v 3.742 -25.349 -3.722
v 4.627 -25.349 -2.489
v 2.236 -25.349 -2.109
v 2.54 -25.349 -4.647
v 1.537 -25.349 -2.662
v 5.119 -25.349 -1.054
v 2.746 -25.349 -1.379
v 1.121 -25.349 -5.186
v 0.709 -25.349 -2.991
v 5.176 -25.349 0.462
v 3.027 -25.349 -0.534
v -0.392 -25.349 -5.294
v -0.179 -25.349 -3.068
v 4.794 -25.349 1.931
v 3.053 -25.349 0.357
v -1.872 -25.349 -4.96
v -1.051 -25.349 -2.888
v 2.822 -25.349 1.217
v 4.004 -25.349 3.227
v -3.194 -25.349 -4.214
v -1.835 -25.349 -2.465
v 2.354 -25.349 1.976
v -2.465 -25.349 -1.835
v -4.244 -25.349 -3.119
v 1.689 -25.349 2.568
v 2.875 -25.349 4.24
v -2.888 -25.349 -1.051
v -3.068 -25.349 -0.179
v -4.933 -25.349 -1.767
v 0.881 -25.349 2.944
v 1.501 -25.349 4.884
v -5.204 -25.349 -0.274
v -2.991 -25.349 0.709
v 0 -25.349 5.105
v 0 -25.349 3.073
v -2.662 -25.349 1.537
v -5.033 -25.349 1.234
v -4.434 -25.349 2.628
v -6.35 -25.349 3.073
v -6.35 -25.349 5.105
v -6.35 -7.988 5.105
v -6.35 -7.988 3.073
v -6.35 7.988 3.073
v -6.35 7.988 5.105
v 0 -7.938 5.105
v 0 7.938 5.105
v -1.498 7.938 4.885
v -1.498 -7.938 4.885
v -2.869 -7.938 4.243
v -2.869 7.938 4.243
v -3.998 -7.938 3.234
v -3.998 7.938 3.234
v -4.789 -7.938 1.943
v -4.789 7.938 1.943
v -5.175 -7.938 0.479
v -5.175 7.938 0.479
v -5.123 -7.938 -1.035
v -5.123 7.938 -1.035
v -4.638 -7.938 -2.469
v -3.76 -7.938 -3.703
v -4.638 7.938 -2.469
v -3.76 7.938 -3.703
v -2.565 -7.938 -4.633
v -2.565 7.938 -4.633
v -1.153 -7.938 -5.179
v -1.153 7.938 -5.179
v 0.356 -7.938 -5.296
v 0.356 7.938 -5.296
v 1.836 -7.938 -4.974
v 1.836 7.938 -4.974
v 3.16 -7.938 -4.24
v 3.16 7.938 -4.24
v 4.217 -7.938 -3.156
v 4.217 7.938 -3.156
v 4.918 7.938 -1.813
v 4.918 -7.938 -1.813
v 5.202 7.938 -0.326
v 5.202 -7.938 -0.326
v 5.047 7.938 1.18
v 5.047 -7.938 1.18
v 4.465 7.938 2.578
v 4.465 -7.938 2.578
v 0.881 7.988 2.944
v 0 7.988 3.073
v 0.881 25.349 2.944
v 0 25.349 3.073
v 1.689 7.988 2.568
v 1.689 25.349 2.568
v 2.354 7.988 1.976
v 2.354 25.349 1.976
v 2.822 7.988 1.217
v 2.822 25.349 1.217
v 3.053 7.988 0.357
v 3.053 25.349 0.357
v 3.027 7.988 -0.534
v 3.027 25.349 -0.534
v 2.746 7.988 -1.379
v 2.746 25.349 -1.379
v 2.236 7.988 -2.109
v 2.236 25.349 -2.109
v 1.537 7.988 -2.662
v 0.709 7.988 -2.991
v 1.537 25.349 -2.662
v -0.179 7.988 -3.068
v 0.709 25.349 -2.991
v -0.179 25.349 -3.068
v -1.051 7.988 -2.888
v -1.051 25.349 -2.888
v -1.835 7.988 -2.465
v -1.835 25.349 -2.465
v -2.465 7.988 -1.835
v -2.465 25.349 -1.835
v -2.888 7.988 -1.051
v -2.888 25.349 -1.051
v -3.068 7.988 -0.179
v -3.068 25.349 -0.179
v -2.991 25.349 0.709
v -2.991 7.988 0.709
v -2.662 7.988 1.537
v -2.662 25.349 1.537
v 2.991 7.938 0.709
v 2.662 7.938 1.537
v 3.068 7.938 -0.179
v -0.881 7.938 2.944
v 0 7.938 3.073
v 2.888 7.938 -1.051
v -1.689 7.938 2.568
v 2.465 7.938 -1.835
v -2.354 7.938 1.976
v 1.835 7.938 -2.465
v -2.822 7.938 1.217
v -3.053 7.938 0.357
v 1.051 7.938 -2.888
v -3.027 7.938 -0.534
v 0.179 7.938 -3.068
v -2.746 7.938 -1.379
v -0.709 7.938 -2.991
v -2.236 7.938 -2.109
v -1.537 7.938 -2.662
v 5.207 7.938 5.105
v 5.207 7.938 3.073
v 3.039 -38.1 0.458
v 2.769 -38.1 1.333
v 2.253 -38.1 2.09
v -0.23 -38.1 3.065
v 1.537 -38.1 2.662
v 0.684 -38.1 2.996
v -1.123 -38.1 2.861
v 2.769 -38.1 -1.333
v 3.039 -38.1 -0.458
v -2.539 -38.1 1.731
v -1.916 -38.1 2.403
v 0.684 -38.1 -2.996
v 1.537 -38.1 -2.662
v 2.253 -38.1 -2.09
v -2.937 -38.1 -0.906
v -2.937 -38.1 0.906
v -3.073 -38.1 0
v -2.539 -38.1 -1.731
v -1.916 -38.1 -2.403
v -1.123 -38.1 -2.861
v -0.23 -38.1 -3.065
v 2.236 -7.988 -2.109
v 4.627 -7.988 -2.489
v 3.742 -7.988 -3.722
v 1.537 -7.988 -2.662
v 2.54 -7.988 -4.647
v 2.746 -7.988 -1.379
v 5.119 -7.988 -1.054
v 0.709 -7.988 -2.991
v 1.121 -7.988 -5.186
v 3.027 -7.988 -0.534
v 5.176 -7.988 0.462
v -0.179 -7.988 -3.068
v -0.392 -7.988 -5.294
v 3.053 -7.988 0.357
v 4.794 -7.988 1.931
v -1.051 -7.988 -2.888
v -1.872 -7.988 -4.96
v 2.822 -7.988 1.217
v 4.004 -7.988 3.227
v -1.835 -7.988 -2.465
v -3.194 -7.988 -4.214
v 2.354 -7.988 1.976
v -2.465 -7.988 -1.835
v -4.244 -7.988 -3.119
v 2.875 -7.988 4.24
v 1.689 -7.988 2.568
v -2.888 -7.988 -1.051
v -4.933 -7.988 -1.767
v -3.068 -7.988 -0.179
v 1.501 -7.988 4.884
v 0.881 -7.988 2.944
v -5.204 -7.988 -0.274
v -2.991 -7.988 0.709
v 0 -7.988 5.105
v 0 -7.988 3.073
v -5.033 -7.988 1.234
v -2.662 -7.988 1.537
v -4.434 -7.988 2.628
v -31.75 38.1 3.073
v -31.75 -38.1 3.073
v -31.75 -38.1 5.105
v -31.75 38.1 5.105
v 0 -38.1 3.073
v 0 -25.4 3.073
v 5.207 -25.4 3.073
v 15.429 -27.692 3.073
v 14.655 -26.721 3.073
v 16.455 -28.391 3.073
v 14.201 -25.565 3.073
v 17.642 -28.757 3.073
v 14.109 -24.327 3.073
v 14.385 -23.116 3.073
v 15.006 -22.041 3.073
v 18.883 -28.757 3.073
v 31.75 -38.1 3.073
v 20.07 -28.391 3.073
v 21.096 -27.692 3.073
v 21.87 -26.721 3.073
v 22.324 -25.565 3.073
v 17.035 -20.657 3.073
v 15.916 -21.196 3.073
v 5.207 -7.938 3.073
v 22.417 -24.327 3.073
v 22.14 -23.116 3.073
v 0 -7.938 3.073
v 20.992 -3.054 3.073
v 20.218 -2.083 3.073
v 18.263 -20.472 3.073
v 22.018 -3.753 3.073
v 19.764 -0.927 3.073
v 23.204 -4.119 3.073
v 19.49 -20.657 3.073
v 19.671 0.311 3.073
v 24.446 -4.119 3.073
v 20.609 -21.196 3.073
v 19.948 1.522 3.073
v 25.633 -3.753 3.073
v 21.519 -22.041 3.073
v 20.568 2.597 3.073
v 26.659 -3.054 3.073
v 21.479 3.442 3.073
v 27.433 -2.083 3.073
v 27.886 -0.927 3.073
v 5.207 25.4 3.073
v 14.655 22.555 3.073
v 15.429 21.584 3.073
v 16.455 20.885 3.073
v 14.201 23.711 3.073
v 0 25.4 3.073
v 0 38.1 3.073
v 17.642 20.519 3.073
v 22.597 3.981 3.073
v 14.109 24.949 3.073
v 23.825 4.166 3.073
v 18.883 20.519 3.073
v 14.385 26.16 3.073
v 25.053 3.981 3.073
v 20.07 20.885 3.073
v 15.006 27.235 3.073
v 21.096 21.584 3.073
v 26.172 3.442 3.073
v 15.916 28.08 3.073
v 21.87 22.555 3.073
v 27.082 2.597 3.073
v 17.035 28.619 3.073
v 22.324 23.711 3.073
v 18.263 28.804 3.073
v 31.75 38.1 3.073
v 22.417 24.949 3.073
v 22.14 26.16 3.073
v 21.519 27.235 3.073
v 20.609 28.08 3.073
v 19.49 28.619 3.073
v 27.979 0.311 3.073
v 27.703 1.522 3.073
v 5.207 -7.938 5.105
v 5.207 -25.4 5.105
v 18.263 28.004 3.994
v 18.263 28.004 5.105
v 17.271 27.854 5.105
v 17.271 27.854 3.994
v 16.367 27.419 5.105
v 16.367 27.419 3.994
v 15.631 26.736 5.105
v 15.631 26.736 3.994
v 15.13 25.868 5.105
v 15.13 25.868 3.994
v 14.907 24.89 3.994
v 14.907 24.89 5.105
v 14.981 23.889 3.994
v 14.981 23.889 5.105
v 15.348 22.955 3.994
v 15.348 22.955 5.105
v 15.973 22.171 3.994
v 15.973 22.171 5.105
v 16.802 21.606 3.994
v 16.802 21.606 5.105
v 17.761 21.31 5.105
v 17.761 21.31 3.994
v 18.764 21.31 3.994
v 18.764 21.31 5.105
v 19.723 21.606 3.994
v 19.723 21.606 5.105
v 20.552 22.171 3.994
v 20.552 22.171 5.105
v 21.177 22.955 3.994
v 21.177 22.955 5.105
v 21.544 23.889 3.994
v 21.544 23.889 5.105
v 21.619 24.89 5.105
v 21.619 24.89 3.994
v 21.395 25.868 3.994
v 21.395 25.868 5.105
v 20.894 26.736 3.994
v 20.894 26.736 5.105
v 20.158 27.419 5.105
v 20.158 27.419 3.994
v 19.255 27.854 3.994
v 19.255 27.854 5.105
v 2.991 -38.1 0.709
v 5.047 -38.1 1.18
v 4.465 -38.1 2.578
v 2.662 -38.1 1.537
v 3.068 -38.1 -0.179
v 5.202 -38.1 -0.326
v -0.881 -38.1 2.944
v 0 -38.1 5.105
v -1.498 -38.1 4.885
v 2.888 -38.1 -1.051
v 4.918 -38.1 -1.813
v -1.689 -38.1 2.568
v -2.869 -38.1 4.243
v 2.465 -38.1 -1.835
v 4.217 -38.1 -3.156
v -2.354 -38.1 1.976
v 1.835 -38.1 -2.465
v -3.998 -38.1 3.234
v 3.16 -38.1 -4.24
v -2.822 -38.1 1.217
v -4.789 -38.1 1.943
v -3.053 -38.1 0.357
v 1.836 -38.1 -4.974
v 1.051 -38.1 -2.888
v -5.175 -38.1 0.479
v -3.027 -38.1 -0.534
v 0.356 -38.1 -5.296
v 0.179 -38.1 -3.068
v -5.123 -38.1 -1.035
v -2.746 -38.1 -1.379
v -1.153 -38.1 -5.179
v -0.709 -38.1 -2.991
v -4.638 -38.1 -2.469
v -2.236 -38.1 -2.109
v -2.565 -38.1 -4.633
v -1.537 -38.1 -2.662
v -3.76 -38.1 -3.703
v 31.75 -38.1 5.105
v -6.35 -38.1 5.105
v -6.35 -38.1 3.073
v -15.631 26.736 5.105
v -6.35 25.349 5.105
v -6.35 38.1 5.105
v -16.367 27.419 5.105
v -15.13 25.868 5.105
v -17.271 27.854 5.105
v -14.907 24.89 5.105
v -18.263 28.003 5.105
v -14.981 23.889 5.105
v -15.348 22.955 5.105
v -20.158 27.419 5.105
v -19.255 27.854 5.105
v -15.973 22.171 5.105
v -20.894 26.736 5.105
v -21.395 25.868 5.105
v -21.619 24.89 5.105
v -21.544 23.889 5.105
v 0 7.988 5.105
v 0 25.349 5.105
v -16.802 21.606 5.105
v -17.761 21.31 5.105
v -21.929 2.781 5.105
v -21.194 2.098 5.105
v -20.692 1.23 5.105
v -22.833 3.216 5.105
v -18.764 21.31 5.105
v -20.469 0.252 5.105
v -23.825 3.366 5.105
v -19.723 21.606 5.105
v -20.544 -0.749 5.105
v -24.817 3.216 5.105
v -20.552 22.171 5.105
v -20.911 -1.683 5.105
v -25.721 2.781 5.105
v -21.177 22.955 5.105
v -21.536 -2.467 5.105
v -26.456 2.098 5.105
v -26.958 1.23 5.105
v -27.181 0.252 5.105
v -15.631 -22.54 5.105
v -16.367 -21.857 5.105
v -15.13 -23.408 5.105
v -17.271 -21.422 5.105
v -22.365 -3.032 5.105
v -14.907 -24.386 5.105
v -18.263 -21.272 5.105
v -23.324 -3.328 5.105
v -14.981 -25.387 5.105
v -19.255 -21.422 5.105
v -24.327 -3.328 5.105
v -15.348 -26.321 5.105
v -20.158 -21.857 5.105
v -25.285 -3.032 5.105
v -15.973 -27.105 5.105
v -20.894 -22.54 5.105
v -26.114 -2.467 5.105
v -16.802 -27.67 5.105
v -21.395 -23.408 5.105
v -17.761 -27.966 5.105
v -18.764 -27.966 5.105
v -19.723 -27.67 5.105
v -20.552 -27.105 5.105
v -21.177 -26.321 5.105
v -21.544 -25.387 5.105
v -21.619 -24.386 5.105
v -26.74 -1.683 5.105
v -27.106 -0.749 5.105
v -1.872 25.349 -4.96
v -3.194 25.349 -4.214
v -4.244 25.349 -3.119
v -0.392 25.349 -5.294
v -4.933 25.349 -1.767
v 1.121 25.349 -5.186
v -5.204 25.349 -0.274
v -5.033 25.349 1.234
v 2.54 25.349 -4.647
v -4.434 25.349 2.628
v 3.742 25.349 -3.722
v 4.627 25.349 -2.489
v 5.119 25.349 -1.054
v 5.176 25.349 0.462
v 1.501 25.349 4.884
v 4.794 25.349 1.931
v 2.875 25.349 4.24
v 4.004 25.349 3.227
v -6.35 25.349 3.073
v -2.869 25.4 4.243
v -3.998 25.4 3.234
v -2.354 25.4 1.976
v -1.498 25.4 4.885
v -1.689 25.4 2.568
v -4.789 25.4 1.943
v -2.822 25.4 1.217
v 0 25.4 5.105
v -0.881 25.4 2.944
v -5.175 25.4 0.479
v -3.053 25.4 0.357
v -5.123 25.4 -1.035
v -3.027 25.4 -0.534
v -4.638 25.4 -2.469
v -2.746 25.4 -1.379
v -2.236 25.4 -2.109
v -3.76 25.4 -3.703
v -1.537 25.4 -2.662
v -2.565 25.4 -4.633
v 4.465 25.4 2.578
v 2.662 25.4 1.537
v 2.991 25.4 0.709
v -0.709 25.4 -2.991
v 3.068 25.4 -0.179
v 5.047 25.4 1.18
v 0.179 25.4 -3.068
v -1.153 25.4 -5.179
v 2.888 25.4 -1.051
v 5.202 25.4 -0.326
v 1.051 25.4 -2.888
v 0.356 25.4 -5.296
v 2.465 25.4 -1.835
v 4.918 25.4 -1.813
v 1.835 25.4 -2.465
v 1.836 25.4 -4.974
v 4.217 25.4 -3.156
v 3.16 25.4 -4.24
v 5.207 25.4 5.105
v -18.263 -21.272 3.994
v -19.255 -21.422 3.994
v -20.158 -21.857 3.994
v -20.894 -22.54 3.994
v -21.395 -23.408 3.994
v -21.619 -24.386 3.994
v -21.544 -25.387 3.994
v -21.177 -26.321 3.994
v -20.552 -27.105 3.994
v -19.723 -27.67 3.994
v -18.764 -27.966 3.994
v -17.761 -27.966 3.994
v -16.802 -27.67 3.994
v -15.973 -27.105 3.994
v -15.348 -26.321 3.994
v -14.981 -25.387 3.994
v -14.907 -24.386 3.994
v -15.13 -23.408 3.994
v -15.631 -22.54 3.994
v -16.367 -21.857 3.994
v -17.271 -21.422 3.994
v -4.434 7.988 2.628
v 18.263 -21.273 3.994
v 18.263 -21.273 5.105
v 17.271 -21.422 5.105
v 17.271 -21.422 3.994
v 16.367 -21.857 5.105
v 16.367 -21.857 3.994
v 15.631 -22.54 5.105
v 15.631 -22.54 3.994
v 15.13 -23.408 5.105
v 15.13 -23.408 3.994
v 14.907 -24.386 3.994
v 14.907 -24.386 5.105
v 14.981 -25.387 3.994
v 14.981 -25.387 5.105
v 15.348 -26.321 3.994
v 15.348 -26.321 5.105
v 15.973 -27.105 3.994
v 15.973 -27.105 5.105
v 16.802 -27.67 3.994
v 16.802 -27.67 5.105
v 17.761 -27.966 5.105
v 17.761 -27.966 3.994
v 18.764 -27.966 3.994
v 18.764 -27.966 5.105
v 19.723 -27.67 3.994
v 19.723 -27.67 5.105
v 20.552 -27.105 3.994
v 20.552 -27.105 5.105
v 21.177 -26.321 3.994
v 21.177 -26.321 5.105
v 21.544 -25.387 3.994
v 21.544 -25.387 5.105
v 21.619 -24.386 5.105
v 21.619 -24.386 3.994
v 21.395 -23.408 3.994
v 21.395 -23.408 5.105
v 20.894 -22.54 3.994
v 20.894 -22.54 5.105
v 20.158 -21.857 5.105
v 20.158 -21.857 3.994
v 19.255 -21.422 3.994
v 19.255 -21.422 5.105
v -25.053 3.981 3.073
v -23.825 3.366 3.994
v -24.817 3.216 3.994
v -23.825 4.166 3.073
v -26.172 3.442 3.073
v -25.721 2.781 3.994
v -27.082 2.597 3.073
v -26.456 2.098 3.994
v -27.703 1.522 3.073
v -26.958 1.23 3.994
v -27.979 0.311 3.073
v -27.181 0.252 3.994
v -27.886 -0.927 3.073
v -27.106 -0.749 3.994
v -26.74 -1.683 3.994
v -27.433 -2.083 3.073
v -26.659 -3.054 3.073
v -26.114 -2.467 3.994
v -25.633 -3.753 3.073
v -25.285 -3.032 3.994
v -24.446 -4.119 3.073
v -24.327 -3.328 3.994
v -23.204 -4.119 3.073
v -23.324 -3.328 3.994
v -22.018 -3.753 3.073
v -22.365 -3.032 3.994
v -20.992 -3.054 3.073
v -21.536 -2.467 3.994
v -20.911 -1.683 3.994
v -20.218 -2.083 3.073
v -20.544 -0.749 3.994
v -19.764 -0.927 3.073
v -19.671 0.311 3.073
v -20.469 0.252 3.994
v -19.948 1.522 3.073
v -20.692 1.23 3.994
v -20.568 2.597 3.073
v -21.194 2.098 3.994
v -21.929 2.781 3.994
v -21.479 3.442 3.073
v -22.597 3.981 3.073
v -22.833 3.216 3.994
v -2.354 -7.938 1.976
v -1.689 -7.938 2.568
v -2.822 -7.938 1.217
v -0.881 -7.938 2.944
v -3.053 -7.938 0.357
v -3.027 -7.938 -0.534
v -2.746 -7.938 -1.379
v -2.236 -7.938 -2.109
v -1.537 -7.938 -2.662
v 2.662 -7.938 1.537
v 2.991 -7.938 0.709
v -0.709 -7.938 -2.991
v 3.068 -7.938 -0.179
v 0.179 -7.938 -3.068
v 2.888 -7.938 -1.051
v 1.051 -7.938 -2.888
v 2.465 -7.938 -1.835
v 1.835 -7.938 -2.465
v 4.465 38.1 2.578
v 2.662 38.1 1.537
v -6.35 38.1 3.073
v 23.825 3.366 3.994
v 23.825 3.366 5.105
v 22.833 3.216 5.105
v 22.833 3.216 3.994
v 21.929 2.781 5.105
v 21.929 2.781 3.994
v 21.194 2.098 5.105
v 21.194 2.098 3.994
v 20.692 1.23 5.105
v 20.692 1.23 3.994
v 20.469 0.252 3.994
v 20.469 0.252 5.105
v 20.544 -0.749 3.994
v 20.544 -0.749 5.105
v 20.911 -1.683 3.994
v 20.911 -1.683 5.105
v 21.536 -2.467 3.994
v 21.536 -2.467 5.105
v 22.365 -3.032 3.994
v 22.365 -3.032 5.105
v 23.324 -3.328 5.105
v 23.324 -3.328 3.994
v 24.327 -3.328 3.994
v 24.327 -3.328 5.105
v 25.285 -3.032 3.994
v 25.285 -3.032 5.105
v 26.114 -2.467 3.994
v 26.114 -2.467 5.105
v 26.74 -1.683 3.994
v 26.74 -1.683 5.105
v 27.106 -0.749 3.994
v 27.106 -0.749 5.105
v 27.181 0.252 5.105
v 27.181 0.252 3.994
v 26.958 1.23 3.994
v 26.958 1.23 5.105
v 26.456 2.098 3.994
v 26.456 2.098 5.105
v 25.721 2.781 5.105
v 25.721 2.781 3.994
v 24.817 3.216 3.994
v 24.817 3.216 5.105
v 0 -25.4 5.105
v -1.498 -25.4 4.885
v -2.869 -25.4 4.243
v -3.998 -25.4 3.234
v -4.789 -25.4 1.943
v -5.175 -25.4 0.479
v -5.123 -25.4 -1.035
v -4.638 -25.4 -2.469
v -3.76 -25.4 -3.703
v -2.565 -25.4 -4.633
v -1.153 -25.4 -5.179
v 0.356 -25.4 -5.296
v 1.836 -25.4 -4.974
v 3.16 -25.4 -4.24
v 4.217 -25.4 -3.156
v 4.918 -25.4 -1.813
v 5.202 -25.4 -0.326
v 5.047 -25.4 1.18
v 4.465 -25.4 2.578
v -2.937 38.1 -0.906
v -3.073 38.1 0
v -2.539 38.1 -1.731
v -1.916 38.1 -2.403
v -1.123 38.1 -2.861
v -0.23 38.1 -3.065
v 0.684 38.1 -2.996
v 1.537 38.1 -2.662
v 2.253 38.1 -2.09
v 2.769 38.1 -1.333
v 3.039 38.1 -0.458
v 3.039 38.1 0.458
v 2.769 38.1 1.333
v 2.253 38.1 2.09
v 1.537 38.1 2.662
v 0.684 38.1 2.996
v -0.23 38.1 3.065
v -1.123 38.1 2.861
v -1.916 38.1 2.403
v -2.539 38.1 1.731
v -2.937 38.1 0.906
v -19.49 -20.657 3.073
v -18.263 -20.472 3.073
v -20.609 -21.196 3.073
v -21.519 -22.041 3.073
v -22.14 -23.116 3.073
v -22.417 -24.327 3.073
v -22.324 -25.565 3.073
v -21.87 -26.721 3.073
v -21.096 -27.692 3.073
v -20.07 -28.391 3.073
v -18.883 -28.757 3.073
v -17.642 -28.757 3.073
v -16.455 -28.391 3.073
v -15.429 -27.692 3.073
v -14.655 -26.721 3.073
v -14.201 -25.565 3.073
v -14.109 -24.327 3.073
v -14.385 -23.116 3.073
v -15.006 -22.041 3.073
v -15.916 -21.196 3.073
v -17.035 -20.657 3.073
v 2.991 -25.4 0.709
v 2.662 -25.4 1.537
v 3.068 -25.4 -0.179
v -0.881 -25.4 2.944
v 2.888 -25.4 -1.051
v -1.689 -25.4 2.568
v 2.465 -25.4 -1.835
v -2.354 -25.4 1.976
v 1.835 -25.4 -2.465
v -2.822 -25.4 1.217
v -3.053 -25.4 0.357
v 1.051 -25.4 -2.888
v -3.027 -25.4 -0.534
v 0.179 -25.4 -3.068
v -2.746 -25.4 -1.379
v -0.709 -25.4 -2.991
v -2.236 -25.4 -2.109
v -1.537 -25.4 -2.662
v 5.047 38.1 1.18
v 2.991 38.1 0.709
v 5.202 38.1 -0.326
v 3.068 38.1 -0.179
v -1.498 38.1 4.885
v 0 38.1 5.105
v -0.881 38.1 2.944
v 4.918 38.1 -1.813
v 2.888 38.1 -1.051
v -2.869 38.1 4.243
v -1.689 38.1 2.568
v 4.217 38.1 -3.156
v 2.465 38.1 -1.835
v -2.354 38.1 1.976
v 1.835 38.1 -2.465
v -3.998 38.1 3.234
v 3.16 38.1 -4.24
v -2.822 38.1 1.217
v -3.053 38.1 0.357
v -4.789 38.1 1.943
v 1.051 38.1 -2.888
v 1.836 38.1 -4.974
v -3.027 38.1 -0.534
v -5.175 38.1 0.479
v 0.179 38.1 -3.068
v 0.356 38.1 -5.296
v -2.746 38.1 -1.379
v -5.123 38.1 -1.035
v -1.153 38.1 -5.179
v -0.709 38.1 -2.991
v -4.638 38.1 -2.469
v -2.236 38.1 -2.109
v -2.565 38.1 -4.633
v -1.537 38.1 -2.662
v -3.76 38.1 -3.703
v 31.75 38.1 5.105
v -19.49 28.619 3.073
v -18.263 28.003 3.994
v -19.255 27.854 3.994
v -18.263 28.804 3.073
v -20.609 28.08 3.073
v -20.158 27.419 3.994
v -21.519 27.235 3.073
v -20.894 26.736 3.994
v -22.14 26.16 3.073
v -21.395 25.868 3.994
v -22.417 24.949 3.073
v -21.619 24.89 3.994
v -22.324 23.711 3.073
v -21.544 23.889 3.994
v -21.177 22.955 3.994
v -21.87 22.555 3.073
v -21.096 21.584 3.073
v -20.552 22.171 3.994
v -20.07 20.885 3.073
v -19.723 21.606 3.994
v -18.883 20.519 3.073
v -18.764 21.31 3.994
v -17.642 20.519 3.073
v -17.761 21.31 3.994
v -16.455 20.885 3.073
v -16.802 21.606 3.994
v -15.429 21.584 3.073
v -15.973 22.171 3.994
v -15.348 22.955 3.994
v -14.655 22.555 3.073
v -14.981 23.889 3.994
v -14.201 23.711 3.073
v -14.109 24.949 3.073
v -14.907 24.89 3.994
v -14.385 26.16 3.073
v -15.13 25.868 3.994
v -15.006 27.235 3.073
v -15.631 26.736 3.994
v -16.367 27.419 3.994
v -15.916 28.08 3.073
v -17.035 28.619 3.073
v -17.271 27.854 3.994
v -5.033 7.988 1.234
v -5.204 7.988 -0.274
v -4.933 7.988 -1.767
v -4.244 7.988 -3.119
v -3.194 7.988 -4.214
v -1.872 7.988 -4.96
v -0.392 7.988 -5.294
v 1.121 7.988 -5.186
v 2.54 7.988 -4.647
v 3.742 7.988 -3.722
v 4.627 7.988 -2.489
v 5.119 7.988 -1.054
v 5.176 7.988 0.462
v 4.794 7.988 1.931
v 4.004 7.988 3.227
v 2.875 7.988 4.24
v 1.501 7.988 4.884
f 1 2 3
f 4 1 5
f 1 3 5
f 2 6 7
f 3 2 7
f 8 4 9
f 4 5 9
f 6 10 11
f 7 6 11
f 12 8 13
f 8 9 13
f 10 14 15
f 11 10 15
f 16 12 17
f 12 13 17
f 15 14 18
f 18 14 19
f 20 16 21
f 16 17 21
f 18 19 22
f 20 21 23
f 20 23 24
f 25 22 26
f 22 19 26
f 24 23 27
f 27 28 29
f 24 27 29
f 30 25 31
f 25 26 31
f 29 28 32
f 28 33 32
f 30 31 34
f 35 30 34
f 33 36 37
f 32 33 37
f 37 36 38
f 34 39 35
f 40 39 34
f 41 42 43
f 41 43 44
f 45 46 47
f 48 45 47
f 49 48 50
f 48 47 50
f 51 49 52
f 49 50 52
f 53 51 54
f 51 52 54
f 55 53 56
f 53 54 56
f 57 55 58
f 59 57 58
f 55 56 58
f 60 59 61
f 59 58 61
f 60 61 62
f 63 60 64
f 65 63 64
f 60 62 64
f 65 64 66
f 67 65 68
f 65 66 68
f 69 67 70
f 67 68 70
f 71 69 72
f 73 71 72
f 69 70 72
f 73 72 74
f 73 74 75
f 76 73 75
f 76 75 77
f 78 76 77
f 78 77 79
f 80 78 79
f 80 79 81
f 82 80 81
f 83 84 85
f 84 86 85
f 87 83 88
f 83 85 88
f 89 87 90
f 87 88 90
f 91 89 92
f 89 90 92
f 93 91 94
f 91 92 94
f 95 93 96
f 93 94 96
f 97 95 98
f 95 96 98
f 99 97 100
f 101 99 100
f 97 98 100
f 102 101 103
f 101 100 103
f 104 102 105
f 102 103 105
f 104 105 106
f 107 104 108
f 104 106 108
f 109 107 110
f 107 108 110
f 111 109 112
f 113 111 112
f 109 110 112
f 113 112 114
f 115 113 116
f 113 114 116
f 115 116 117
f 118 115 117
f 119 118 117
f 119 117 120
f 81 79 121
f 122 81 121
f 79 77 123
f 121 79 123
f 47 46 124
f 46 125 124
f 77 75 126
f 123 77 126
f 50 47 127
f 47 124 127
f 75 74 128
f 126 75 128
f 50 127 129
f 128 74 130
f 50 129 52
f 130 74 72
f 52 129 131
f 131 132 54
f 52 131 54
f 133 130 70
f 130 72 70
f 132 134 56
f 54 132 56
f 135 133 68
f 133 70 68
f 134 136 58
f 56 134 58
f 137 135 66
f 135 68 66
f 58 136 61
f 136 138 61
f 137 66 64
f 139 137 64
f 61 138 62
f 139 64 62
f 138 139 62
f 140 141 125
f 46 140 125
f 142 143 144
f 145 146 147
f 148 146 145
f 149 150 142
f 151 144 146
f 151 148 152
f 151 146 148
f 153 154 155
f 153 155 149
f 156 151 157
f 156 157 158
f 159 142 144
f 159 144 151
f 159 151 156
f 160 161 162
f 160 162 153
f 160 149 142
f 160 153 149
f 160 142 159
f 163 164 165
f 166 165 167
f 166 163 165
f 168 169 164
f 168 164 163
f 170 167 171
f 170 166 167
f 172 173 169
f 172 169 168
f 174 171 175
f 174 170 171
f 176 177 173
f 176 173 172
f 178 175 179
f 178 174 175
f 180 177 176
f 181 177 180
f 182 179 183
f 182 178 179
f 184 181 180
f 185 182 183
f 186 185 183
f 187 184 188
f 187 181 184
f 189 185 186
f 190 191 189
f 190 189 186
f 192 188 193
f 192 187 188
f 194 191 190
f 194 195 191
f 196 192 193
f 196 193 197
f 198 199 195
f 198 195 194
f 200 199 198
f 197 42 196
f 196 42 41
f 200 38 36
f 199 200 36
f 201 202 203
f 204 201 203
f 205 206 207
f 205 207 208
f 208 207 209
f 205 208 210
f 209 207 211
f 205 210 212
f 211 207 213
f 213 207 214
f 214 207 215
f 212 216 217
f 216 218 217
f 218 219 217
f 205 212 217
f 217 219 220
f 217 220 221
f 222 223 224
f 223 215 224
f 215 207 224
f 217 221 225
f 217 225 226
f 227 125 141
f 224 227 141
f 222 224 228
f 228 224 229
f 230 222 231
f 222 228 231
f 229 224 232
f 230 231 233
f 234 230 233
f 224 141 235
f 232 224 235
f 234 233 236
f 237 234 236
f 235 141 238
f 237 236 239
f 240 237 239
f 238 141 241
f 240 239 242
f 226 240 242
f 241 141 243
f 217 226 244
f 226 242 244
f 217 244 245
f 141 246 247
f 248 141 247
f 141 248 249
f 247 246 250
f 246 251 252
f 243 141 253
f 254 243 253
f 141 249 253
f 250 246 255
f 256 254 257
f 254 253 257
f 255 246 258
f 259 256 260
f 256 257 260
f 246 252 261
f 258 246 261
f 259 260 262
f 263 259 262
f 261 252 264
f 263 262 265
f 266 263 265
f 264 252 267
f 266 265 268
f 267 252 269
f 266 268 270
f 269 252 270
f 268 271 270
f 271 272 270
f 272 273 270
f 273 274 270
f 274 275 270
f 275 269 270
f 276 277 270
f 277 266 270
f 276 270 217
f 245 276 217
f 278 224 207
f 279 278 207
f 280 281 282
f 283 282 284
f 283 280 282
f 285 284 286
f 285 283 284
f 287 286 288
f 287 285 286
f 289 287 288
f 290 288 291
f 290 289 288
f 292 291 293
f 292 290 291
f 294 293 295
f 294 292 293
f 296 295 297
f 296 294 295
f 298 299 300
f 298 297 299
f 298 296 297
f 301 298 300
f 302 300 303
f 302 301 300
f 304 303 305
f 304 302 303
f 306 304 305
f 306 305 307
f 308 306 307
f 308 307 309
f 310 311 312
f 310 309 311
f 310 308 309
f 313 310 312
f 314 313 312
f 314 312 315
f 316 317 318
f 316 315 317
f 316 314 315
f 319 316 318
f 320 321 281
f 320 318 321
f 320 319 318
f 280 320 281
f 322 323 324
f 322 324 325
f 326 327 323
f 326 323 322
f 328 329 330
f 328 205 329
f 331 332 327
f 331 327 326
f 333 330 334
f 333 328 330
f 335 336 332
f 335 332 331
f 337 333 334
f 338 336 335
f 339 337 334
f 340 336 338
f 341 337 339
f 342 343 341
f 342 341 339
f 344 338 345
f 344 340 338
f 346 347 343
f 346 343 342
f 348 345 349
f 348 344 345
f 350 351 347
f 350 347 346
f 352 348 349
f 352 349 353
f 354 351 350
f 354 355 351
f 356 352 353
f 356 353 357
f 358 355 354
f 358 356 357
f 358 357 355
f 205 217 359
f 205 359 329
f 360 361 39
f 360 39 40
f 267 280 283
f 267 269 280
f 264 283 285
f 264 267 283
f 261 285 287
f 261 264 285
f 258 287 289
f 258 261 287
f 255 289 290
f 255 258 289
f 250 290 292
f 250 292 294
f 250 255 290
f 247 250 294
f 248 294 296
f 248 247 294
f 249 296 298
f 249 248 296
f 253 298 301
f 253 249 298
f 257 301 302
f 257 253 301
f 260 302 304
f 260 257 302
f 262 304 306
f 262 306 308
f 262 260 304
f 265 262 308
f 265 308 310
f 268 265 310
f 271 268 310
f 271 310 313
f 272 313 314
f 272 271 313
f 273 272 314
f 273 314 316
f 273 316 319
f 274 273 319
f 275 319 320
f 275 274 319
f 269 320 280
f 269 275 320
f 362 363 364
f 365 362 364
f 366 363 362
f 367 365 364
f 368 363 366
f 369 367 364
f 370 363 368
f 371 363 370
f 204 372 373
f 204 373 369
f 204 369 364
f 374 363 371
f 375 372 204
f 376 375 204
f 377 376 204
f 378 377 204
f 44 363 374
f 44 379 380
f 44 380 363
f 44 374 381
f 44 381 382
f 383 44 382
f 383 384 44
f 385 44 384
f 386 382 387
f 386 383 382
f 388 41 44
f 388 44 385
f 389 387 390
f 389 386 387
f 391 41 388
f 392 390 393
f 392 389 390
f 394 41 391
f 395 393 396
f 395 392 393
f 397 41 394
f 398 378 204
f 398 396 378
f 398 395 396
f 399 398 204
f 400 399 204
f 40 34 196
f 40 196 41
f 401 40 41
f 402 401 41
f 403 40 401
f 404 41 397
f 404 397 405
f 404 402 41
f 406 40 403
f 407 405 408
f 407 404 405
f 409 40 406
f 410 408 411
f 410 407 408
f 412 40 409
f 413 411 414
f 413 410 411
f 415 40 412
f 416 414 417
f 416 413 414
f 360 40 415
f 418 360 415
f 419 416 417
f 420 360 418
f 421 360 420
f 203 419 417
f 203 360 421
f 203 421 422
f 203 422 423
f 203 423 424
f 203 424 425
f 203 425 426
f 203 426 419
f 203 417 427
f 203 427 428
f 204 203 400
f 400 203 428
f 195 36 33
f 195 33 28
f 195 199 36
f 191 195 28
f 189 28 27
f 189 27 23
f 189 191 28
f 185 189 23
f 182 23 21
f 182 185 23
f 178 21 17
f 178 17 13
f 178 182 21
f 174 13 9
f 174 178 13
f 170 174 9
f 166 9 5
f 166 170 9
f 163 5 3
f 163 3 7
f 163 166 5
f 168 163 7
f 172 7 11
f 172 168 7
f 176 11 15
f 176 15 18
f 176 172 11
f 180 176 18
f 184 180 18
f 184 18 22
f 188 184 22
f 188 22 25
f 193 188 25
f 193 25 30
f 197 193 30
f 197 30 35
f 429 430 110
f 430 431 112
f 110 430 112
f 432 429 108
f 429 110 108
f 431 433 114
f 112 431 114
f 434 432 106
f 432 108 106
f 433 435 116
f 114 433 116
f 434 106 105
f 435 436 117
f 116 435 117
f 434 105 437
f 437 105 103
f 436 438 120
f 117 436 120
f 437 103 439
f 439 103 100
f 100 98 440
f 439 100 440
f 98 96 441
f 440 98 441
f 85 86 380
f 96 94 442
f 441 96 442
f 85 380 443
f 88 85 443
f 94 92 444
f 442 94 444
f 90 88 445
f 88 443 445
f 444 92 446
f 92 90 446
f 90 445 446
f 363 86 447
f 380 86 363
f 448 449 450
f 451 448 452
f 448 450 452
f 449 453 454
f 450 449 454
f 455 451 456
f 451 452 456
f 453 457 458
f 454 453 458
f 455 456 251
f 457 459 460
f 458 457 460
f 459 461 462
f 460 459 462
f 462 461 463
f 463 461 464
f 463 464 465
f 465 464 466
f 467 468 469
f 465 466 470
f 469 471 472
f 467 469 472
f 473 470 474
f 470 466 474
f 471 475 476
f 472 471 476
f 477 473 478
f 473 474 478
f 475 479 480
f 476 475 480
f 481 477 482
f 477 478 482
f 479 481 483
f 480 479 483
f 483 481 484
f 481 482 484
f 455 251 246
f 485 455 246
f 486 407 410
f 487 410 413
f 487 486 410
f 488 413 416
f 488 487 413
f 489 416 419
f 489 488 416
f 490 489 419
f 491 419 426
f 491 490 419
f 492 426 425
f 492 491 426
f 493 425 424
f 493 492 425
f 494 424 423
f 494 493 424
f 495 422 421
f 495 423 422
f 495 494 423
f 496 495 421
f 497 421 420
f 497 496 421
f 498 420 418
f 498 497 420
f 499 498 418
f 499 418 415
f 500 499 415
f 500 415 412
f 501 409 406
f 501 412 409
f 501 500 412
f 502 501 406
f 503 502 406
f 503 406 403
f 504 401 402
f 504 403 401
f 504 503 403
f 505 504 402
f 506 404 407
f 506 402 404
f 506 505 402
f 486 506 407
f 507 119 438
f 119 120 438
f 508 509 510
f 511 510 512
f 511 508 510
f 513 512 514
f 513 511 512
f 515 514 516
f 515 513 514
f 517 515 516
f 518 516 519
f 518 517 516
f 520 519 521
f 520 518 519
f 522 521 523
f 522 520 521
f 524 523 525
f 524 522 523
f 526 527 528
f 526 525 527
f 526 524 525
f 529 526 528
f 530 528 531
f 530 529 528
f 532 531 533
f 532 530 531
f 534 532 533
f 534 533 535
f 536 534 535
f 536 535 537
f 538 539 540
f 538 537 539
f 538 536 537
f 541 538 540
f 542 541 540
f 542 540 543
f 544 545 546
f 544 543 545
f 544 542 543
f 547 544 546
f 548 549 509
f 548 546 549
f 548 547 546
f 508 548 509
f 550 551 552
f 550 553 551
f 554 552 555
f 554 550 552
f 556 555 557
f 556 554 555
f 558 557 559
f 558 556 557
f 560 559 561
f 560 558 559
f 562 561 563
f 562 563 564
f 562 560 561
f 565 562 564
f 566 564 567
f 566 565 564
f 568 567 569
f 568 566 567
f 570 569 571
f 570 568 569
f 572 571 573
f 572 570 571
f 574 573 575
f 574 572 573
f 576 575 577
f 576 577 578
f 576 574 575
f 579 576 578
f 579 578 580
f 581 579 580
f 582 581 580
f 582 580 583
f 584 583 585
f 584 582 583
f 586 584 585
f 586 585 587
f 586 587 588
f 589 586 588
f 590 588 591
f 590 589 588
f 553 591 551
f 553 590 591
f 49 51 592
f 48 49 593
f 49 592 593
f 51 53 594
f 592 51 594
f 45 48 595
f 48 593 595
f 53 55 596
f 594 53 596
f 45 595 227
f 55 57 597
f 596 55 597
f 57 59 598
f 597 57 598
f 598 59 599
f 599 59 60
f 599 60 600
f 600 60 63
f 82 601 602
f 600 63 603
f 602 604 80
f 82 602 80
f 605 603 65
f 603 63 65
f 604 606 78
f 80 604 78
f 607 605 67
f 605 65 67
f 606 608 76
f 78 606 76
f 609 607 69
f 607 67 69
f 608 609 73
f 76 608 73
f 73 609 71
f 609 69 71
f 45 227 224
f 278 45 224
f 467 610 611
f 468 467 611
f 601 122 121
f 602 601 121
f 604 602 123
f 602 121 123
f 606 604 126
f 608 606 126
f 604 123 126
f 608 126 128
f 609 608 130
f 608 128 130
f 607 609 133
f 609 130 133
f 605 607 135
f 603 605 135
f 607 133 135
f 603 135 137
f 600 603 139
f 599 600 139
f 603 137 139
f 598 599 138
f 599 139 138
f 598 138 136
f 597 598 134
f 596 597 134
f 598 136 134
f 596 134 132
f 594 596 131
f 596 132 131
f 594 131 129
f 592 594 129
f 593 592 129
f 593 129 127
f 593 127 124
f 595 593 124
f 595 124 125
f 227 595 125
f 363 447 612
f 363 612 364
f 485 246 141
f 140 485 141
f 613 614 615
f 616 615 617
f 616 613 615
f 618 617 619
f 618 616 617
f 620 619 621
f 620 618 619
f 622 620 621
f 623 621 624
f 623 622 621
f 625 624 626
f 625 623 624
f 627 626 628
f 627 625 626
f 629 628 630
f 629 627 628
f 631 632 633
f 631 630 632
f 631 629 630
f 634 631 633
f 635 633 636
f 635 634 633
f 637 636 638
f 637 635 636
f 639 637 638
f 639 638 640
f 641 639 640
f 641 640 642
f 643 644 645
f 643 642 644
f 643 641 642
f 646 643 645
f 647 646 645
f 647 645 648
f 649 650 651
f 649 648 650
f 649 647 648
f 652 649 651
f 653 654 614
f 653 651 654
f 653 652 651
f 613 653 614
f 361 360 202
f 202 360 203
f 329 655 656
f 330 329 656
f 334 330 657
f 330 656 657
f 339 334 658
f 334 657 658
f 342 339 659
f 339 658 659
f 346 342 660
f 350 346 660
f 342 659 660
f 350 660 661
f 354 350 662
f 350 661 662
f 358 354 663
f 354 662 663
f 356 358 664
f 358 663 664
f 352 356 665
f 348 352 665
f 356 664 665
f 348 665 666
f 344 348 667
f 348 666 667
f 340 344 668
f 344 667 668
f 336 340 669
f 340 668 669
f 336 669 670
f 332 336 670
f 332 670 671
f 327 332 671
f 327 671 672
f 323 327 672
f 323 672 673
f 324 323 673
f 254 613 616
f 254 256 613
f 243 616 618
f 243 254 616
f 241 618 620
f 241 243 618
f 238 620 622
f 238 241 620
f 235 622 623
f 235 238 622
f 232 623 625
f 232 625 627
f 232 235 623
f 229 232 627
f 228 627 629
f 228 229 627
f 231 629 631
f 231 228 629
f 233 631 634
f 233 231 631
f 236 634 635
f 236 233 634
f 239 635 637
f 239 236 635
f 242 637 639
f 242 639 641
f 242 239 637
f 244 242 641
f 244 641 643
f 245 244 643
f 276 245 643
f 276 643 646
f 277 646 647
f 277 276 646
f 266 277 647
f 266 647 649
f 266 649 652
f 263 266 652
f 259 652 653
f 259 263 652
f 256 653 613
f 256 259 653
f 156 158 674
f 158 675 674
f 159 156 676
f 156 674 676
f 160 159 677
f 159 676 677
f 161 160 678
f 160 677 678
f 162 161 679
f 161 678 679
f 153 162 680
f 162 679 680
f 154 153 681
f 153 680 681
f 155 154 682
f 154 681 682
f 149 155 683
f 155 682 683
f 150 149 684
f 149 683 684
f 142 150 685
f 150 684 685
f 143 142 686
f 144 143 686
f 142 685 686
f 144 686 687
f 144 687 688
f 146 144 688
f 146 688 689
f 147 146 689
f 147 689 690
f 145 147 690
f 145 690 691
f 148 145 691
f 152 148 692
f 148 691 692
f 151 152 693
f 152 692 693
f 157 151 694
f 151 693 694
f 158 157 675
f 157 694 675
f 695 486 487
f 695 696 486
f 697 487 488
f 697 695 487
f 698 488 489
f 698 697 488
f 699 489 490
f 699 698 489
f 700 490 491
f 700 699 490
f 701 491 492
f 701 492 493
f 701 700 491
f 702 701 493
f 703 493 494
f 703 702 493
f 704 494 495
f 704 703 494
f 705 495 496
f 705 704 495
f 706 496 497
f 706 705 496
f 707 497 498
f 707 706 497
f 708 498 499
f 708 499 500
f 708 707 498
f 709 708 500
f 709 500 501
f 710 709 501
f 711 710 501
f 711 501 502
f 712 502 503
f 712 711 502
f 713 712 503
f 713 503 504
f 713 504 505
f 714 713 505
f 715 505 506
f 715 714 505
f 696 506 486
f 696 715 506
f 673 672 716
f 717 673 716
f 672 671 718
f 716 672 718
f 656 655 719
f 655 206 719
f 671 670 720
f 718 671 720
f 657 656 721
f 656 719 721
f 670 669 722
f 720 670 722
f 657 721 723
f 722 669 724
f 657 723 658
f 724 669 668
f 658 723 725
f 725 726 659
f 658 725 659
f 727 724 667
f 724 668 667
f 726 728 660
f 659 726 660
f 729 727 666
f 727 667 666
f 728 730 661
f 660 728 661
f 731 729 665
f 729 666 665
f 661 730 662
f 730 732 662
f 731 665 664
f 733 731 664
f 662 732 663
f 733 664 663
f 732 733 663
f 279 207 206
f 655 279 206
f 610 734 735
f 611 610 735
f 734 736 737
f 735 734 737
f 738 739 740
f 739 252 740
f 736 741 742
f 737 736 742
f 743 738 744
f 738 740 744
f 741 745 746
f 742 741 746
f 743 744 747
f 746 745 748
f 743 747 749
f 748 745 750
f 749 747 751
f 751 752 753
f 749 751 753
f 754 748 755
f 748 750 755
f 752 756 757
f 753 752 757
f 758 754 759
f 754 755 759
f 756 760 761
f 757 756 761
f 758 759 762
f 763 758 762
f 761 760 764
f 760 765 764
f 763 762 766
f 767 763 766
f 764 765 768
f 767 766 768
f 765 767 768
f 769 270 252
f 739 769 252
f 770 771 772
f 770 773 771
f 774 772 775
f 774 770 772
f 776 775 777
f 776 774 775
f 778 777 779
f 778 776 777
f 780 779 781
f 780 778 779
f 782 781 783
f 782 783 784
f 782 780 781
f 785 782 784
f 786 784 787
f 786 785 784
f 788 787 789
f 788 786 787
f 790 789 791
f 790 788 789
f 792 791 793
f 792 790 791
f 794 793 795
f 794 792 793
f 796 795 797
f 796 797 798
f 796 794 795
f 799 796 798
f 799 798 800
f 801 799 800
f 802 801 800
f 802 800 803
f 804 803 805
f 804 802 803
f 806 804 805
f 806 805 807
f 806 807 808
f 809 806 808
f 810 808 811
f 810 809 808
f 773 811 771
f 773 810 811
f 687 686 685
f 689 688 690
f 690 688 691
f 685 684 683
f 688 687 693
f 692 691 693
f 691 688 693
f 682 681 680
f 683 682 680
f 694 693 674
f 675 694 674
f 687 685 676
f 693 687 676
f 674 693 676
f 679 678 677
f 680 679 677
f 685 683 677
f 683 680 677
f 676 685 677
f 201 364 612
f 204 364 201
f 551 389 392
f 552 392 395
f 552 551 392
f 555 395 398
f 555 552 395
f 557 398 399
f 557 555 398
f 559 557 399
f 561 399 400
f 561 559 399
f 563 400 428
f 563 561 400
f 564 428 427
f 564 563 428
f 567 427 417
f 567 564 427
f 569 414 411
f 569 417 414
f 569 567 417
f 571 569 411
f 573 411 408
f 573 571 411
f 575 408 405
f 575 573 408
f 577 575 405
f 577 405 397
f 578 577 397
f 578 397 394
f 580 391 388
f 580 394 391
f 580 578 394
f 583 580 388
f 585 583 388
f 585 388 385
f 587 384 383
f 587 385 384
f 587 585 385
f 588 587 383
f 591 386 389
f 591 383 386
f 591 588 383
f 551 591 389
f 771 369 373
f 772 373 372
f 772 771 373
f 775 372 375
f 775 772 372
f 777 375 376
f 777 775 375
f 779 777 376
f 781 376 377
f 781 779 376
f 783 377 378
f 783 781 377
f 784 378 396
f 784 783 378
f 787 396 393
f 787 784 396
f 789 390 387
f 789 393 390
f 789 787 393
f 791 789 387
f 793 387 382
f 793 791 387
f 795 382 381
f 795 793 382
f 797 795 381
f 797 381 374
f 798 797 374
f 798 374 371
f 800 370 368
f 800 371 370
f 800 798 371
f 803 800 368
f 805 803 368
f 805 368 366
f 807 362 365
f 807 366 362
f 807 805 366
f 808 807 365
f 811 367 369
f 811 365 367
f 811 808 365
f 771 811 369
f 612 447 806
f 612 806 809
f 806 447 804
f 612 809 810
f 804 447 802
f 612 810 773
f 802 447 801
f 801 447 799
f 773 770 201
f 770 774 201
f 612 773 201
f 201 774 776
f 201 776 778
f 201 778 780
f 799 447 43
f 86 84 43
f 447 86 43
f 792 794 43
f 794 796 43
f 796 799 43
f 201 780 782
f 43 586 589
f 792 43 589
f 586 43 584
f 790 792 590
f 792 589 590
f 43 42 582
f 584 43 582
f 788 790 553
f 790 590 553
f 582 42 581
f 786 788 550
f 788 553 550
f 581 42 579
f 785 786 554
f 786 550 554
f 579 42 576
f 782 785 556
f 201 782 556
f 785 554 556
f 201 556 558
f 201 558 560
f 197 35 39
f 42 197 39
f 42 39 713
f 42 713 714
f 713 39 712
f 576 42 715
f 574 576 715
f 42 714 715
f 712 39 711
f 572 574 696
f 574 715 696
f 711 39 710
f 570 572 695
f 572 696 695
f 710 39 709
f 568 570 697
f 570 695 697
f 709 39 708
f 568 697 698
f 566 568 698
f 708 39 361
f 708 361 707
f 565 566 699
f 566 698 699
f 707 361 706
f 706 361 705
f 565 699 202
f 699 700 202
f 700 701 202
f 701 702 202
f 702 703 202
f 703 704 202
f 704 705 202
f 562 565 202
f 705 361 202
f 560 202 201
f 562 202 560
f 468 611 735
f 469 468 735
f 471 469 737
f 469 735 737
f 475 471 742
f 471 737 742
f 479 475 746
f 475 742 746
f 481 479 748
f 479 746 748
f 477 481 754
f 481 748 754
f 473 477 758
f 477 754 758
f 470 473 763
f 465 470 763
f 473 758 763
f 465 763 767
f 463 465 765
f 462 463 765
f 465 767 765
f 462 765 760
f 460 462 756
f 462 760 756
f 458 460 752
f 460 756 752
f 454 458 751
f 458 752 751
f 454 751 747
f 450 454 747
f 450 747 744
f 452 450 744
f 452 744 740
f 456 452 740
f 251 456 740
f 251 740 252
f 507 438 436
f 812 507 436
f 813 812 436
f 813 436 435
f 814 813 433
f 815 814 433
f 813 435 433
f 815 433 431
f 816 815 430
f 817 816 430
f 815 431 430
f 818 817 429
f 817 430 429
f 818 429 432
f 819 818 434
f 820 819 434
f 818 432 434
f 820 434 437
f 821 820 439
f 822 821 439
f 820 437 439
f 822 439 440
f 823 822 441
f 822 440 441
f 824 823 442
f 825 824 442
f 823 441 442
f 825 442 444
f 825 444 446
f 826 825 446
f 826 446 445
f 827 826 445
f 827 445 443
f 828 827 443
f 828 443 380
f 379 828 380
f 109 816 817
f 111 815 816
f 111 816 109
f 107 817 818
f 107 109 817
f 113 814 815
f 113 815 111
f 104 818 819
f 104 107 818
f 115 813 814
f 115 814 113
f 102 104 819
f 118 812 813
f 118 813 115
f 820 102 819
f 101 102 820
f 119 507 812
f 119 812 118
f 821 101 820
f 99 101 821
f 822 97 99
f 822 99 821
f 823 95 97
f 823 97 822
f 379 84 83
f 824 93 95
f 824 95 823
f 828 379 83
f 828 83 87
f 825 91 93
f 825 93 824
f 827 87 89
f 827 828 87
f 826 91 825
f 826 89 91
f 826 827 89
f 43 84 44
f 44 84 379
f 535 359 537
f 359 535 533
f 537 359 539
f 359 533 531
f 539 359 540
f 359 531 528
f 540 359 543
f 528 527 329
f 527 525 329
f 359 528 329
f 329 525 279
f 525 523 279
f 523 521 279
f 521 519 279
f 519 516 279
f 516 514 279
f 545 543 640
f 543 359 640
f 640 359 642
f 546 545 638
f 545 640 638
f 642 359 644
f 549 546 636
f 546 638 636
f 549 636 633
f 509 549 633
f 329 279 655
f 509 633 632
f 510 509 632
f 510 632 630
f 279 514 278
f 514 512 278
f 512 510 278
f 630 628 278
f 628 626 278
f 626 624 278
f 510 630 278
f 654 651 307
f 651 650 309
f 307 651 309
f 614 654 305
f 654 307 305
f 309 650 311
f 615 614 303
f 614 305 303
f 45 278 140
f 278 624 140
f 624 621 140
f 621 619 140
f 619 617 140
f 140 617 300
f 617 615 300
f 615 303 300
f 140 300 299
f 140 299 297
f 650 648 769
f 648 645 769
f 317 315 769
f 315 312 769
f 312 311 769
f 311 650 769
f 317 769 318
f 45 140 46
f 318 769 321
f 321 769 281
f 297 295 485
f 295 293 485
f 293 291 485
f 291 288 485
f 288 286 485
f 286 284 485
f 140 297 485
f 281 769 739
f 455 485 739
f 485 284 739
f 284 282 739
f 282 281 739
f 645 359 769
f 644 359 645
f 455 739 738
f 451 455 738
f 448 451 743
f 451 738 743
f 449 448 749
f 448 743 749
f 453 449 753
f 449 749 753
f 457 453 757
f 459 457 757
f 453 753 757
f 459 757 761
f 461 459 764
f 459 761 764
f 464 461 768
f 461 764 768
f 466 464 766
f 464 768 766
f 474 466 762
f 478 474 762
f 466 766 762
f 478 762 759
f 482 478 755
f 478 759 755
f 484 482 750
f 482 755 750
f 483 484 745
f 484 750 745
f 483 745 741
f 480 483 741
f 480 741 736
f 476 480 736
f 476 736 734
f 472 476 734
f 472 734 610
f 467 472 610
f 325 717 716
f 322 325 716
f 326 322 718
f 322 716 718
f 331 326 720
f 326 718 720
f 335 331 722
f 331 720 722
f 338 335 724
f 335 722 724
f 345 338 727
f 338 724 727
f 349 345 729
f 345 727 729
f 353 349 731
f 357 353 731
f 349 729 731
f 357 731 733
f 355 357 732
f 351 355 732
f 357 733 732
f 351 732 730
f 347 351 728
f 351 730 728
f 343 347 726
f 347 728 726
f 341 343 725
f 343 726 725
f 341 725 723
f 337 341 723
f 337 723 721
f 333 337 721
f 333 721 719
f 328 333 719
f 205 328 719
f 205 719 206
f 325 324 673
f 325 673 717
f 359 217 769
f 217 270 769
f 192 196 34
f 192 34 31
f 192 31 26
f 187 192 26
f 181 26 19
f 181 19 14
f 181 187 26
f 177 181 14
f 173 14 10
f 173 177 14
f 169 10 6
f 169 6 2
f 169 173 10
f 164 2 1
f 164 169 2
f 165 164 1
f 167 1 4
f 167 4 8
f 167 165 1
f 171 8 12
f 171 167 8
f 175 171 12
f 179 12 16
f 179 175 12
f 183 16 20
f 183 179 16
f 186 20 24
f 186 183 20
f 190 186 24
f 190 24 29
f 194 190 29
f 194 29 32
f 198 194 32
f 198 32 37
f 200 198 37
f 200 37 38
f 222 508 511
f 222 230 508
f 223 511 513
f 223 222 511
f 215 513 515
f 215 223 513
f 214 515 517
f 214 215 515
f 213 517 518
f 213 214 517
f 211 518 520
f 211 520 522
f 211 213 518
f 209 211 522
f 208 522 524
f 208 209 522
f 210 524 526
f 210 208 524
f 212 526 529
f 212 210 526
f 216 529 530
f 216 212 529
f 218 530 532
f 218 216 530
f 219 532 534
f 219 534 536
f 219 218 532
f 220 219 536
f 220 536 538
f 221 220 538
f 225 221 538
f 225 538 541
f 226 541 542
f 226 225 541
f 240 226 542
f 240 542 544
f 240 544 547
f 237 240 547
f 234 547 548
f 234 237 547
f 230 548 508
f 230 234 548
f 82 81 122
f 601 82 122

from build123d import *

# Parameters (mm, degrees)
EXTRUDE1_DEPTH                                = 38.1
CUT_EXTRUDE1_DEPTH                            = 9.382
CUT_EXTRUDE1_DEPTH_BACK                       = 3.032
EXTRUDE2_DEPTH                                = 8.68045
EXTRUDE2_DEPTH_BACK                           = 8.68045
EXTRUDE3_DEPTH                                = 8.68045
EXTRUDE3_DEPTH_BACK                           = 8.68045
EXTRUDE4_START                                = -21.43125
SKETCH5_W                                     = 25.4
SKETCH5_H                                     = 2.032
EXTRUDE4_DEPTH                                = 76.2
SKETCH6_W                                     = 3.0734
SKETCH6_H                                     = 76.2
CSK_FOR_8_FLAT_HEAD_MACHINE_SCREW2_AT_2_COUNT = 2
CSK_FOR_8_FLAT_HEAD_MACHINE_SCREW2_AT_2_PITCH = 25.258138545
CSK_FOR_8_FLAT_HEAD_MACHINE_SCREW2_AT_3_COUNT = 2
CSK_FOR_8_FLAT_HEAD_MACHINE_SCREW2_AT_3_PITCH = 25.258138545
CSK_FOR_8_FLAT_HEAD_MACHINE_SCREW2_AT_4_COUNT = 2
CSK_FOR_8_FLAT_HEAD_MACHINE_SCREW2_AT_4_PITCH = 48.768985563
CSK_FOR_8_FLAT_HEAD_MACHINE_SCREW2_AT_5_COUNT = 2
CSK_FOR_8_FLAT_HEAD_MACHINE_SCREW2_AT_5_PITCH = 47.6504
CSK_FOR_8_FLAT_HEAD_MACHINE_SCREW2_AT_6_COUNT = 2
CSK_FOR_8_FLAT_HEAD_MACHINE_SCREW2_AT_6_PITCH = 48.768985563


with BuildPart() as part:
    # Sketch1 → Extrude1 (new body, symmetric)
    with BuildSketch(Plane(origin=(0, 0, 0), x_dir=(1, 0, 0), z_dir=(0, 1, 0))):
        with BuildLine():
            Line((0, -3.0734), (31.75, -3.0734))
            Line((31.75, -3.0734), (31.75, -5.1054))
            Line((31.75, -5.1054), (0, -5.1054))
            ThreePointArc((0, -5.1054), (-2.565305705, 4.63283114), (4.464756325, -2.577728266))
            Line((4.464756325, -2.577728266), (2.661642476, -1.5367))
            ThreePointArc((2.661642476, -1.5367), (-1.5367, 2.661642476), (0, -3.0734))
        make_face()
    extrude(amount=EXTRUDE1_DEPTH, both=True)

    # Sketch2 → Cut-Extrude1 (cut, two sides)
    with BuildSketch(Plane(origin=(0, 0, 3.0734), x_dir=(-1, 0, 0), z_dir=(0, 0, -1))) as cut_extrude1_sk:
        Polygon((5.207, 217.478391172), (5.207, 38.1), (5.207, 25.4), (-5.207, 25.4), (-5.207, 7.9375), (5.207, 7.9375), (5.207, -7.9375), (-5.207, -7.9375), (-5.207, -25.4), (5.207, -25.4), (5.207, -38.1), (5.207, -217.478391172), (363.963782344, -217.478391172), (363.963782344, 217.478391172), align=None)
    extrude(amount=CUT_EXTRUDE1_DEPTH, mode=Mode.SUBTRACT)
    extrude(cut_extrude1_sk.sketch, amount=-CUT_EXTRUDE1_DEPTH_BACK, mode=Mode.SUBTRACT)


with BuildPart() as body_2:
    # Sketch3 → Extrude2 (new body, two sides)
    with BuildSketch(Plane(origin=(0, 16.66875, 0), x_dir=(-1, 0, 0), z_dir=(0, 1, 0))) as extrude2_sk:
        with BuildLine():
            Line((31.75, 5.1054), (31.75, 3.0734))
            Line((31.75, 3.0734), (0, 3.0734))
            ThreePointArc((0, 3.0734), (-1.5367, -2.661642476), (2.661642476, 1.5367))
            Line((2.661642476, 1.5367), (4.434312541, 2.627817757))
            ThreePointArc((4.434312541, 2.627817757), (-2.539760888, -4.64719827), (0, 5.1054))
            Line((0, 5.1054), (31.75, 5.1054))
        make_face()
    extrude(amount=EXTRUDE2_DEPTH)
    extrude(extrude2_sk.sketch, amount=-EXTRUDE2_DEPTH_BACK)



with BuildPart() as body_3:
    # Sketch4 → Extrude3 (new body, two sides)
    with BuildSketch(Plane(origin=(0, -16.66875, 0), x_dir=(-1, 0, 0), z_dir=(0, 1, 0))) as extrude3_sk:
        with BuildLine():
            Line((0, 3.0734), (31.75, 3.0734))
            Line((31.75, 3.0734), (31.75, 5.1054))
            Line((31.75, 5.1054), (0, 5.1054))
            ThreePointArc((0, 5.1054), (-2.539760888, -4.64719827), (4.434312541, 2.627817757))
            Line((4.434312541, 2.627817757), (2.661642476, 1.5367))
            ThreePointArc((2.661642476, 1.5367), (-1.5367, -2.661642476), (0, 3.0734))
        make_face()
    extrude(amount=EXTRUDE3_DEPTH)
    extrude(extrude3_sk.sketch, amount=-EXTRUDE3_DEPTH_BACK)


with BuildPart() as body_2_1:
    add(body_2.part)

    add(body_3.part)  # Extrude4 merges body 3
    # Sketch5 → Extrude4 (add)
    with BuildSketch(Plane(origin=(0, -16.66875, 0), x_dir=(-1, 0, 0), z_dir=(0, 1, 0)).offset(EXTRUDE4_START)):
        with Locations((19.05, 4.0894)):
            Rectangle(SKETCH5_W, SKETCH5_H)
    extrude(amount=EXTRUDE4_DEPTH)

    # Sketch9 → CSK for #8 Flat Head Machine Screw2 (revolve, cut)
    with BuildSketch(Plane(origin=(-23.8252, 0, 3.0734), x_dir=(0, 1, 0), z_dir=(1, 0, 0))):
        Polygon((0, 0), (0, 4.130193213), (3.3655, 2.1079968), (3.3655, 0.920409763), (4.1656, 0), align=None)
    csk_for_8_flat_head_machine_screw2 = revolve(axis=Axis((-23.8252, 0, -3.2766), (0, 0, 1)), mode=Mode.SUBTRACT)

    # CSK for #8 Flat Head Machine Screw2 at 2: CSK for #8 Flat Head Machine Screw2 ×2
    with Locations(*[Vector(0.220230006, 0.975447971, 0) * (i * CSK_FOR_8_FLAT_HEAD_MACHINE_SCREW2_AT_2_PITCH) for i in range(1, CSK_FOR_8_FLAT_HEAD_MACHINE_SCREW2_AT_2_COUNT)]):
        add(csk_for_8_flat_head_machine_screw2, mode=Mode.SUBTRACT)

    # CSK for #8 Flat Head Machine Screw2 at 3: CSK for #8 Flat Head Machine Screw2 ×2
    with Locations(*[Vector(0.220230006, -0.975447971, 0) * (i * CSK_FOR_8_FLAT_HEAD_MACHINE_SCREW2_AT_3_PITCH) for i in range(1, CSK_FOR_8_FLAT_HEAD_MACHINE_SCREW2_AT_3_COUNT)]):
        add(csk_for_8_flat_head_machine_screw2, mode=Mode.SUBTRACT)


with BuildPart() as body_3_2:
    # Sketch6 → Revolve1 (revolve)
    with BuildSketch(Plane.XY):
        with Locations((-1.5367, 0)):
            Rectangle(SKETCH6_W, SKETCH6_H)
    revolve(axis=Axis((0, 42.361566849, 0), (0, -1, 0)))


with BuildPart() as part_1:
    add(part.part)

    # CSK for #8 Flat Head Machine Screw2 at 4: CSK for #8 Flat Head Machine Screw2 ×2
    with Locations(*[Vector(0.863003393, -0.505198124, 0) * (i * CSK_FOR_8_FLAT_HEAD_MACHINE_SCREW2_AT_4_PITCH) for i in range(1, CSK_FOR_8_FLAT_HEAD_MACHINE_SCREW2_AT_4_COUNT)]):
        add(csk_for_8_flat_head_machine_screw2, mode=Mode.SUBTRACT)

    # CSK for #8 Flat Head Machine Screw2 at 5: CSK for #8 Flat Head Machine Screw2 ×2
    with Locations(*[(i * CSK_FOR_8_FLAT_HEAD_MACHINE_SCREW2_AT_5_PITCH, 0, 0) for i in range(1, CSK_FOR_8_FLAT_HEAD_MACHINE_SCREW2_AT_5_COUNT)]):
        add(csk_for_8_flat_head_machine_screw2, mode=Mode.SUBTRACT)

    # CSK for #8 Flat Head Machine Screw2 at 6: CSK for #8 Flat Head Machine Screw2 ×2
    with Locations(*[Vector(0.863003393, 0.505198124, 0) * (i * CSK_FOR_8_FLAT_HEAD_MACHINE_SCREW2_AT_6_PITCH) for i in range(1, CSK_FOR_8_FLAT_HEAD_MACHINE_SCREW2_AT_6_COUNT)]):
        add(csk_for_8_flat_head_machine_screw2, mode=Mode.SUBTRACT)


solid = Compound([body_2_1.part, body_3_2.part, part_1.part])
